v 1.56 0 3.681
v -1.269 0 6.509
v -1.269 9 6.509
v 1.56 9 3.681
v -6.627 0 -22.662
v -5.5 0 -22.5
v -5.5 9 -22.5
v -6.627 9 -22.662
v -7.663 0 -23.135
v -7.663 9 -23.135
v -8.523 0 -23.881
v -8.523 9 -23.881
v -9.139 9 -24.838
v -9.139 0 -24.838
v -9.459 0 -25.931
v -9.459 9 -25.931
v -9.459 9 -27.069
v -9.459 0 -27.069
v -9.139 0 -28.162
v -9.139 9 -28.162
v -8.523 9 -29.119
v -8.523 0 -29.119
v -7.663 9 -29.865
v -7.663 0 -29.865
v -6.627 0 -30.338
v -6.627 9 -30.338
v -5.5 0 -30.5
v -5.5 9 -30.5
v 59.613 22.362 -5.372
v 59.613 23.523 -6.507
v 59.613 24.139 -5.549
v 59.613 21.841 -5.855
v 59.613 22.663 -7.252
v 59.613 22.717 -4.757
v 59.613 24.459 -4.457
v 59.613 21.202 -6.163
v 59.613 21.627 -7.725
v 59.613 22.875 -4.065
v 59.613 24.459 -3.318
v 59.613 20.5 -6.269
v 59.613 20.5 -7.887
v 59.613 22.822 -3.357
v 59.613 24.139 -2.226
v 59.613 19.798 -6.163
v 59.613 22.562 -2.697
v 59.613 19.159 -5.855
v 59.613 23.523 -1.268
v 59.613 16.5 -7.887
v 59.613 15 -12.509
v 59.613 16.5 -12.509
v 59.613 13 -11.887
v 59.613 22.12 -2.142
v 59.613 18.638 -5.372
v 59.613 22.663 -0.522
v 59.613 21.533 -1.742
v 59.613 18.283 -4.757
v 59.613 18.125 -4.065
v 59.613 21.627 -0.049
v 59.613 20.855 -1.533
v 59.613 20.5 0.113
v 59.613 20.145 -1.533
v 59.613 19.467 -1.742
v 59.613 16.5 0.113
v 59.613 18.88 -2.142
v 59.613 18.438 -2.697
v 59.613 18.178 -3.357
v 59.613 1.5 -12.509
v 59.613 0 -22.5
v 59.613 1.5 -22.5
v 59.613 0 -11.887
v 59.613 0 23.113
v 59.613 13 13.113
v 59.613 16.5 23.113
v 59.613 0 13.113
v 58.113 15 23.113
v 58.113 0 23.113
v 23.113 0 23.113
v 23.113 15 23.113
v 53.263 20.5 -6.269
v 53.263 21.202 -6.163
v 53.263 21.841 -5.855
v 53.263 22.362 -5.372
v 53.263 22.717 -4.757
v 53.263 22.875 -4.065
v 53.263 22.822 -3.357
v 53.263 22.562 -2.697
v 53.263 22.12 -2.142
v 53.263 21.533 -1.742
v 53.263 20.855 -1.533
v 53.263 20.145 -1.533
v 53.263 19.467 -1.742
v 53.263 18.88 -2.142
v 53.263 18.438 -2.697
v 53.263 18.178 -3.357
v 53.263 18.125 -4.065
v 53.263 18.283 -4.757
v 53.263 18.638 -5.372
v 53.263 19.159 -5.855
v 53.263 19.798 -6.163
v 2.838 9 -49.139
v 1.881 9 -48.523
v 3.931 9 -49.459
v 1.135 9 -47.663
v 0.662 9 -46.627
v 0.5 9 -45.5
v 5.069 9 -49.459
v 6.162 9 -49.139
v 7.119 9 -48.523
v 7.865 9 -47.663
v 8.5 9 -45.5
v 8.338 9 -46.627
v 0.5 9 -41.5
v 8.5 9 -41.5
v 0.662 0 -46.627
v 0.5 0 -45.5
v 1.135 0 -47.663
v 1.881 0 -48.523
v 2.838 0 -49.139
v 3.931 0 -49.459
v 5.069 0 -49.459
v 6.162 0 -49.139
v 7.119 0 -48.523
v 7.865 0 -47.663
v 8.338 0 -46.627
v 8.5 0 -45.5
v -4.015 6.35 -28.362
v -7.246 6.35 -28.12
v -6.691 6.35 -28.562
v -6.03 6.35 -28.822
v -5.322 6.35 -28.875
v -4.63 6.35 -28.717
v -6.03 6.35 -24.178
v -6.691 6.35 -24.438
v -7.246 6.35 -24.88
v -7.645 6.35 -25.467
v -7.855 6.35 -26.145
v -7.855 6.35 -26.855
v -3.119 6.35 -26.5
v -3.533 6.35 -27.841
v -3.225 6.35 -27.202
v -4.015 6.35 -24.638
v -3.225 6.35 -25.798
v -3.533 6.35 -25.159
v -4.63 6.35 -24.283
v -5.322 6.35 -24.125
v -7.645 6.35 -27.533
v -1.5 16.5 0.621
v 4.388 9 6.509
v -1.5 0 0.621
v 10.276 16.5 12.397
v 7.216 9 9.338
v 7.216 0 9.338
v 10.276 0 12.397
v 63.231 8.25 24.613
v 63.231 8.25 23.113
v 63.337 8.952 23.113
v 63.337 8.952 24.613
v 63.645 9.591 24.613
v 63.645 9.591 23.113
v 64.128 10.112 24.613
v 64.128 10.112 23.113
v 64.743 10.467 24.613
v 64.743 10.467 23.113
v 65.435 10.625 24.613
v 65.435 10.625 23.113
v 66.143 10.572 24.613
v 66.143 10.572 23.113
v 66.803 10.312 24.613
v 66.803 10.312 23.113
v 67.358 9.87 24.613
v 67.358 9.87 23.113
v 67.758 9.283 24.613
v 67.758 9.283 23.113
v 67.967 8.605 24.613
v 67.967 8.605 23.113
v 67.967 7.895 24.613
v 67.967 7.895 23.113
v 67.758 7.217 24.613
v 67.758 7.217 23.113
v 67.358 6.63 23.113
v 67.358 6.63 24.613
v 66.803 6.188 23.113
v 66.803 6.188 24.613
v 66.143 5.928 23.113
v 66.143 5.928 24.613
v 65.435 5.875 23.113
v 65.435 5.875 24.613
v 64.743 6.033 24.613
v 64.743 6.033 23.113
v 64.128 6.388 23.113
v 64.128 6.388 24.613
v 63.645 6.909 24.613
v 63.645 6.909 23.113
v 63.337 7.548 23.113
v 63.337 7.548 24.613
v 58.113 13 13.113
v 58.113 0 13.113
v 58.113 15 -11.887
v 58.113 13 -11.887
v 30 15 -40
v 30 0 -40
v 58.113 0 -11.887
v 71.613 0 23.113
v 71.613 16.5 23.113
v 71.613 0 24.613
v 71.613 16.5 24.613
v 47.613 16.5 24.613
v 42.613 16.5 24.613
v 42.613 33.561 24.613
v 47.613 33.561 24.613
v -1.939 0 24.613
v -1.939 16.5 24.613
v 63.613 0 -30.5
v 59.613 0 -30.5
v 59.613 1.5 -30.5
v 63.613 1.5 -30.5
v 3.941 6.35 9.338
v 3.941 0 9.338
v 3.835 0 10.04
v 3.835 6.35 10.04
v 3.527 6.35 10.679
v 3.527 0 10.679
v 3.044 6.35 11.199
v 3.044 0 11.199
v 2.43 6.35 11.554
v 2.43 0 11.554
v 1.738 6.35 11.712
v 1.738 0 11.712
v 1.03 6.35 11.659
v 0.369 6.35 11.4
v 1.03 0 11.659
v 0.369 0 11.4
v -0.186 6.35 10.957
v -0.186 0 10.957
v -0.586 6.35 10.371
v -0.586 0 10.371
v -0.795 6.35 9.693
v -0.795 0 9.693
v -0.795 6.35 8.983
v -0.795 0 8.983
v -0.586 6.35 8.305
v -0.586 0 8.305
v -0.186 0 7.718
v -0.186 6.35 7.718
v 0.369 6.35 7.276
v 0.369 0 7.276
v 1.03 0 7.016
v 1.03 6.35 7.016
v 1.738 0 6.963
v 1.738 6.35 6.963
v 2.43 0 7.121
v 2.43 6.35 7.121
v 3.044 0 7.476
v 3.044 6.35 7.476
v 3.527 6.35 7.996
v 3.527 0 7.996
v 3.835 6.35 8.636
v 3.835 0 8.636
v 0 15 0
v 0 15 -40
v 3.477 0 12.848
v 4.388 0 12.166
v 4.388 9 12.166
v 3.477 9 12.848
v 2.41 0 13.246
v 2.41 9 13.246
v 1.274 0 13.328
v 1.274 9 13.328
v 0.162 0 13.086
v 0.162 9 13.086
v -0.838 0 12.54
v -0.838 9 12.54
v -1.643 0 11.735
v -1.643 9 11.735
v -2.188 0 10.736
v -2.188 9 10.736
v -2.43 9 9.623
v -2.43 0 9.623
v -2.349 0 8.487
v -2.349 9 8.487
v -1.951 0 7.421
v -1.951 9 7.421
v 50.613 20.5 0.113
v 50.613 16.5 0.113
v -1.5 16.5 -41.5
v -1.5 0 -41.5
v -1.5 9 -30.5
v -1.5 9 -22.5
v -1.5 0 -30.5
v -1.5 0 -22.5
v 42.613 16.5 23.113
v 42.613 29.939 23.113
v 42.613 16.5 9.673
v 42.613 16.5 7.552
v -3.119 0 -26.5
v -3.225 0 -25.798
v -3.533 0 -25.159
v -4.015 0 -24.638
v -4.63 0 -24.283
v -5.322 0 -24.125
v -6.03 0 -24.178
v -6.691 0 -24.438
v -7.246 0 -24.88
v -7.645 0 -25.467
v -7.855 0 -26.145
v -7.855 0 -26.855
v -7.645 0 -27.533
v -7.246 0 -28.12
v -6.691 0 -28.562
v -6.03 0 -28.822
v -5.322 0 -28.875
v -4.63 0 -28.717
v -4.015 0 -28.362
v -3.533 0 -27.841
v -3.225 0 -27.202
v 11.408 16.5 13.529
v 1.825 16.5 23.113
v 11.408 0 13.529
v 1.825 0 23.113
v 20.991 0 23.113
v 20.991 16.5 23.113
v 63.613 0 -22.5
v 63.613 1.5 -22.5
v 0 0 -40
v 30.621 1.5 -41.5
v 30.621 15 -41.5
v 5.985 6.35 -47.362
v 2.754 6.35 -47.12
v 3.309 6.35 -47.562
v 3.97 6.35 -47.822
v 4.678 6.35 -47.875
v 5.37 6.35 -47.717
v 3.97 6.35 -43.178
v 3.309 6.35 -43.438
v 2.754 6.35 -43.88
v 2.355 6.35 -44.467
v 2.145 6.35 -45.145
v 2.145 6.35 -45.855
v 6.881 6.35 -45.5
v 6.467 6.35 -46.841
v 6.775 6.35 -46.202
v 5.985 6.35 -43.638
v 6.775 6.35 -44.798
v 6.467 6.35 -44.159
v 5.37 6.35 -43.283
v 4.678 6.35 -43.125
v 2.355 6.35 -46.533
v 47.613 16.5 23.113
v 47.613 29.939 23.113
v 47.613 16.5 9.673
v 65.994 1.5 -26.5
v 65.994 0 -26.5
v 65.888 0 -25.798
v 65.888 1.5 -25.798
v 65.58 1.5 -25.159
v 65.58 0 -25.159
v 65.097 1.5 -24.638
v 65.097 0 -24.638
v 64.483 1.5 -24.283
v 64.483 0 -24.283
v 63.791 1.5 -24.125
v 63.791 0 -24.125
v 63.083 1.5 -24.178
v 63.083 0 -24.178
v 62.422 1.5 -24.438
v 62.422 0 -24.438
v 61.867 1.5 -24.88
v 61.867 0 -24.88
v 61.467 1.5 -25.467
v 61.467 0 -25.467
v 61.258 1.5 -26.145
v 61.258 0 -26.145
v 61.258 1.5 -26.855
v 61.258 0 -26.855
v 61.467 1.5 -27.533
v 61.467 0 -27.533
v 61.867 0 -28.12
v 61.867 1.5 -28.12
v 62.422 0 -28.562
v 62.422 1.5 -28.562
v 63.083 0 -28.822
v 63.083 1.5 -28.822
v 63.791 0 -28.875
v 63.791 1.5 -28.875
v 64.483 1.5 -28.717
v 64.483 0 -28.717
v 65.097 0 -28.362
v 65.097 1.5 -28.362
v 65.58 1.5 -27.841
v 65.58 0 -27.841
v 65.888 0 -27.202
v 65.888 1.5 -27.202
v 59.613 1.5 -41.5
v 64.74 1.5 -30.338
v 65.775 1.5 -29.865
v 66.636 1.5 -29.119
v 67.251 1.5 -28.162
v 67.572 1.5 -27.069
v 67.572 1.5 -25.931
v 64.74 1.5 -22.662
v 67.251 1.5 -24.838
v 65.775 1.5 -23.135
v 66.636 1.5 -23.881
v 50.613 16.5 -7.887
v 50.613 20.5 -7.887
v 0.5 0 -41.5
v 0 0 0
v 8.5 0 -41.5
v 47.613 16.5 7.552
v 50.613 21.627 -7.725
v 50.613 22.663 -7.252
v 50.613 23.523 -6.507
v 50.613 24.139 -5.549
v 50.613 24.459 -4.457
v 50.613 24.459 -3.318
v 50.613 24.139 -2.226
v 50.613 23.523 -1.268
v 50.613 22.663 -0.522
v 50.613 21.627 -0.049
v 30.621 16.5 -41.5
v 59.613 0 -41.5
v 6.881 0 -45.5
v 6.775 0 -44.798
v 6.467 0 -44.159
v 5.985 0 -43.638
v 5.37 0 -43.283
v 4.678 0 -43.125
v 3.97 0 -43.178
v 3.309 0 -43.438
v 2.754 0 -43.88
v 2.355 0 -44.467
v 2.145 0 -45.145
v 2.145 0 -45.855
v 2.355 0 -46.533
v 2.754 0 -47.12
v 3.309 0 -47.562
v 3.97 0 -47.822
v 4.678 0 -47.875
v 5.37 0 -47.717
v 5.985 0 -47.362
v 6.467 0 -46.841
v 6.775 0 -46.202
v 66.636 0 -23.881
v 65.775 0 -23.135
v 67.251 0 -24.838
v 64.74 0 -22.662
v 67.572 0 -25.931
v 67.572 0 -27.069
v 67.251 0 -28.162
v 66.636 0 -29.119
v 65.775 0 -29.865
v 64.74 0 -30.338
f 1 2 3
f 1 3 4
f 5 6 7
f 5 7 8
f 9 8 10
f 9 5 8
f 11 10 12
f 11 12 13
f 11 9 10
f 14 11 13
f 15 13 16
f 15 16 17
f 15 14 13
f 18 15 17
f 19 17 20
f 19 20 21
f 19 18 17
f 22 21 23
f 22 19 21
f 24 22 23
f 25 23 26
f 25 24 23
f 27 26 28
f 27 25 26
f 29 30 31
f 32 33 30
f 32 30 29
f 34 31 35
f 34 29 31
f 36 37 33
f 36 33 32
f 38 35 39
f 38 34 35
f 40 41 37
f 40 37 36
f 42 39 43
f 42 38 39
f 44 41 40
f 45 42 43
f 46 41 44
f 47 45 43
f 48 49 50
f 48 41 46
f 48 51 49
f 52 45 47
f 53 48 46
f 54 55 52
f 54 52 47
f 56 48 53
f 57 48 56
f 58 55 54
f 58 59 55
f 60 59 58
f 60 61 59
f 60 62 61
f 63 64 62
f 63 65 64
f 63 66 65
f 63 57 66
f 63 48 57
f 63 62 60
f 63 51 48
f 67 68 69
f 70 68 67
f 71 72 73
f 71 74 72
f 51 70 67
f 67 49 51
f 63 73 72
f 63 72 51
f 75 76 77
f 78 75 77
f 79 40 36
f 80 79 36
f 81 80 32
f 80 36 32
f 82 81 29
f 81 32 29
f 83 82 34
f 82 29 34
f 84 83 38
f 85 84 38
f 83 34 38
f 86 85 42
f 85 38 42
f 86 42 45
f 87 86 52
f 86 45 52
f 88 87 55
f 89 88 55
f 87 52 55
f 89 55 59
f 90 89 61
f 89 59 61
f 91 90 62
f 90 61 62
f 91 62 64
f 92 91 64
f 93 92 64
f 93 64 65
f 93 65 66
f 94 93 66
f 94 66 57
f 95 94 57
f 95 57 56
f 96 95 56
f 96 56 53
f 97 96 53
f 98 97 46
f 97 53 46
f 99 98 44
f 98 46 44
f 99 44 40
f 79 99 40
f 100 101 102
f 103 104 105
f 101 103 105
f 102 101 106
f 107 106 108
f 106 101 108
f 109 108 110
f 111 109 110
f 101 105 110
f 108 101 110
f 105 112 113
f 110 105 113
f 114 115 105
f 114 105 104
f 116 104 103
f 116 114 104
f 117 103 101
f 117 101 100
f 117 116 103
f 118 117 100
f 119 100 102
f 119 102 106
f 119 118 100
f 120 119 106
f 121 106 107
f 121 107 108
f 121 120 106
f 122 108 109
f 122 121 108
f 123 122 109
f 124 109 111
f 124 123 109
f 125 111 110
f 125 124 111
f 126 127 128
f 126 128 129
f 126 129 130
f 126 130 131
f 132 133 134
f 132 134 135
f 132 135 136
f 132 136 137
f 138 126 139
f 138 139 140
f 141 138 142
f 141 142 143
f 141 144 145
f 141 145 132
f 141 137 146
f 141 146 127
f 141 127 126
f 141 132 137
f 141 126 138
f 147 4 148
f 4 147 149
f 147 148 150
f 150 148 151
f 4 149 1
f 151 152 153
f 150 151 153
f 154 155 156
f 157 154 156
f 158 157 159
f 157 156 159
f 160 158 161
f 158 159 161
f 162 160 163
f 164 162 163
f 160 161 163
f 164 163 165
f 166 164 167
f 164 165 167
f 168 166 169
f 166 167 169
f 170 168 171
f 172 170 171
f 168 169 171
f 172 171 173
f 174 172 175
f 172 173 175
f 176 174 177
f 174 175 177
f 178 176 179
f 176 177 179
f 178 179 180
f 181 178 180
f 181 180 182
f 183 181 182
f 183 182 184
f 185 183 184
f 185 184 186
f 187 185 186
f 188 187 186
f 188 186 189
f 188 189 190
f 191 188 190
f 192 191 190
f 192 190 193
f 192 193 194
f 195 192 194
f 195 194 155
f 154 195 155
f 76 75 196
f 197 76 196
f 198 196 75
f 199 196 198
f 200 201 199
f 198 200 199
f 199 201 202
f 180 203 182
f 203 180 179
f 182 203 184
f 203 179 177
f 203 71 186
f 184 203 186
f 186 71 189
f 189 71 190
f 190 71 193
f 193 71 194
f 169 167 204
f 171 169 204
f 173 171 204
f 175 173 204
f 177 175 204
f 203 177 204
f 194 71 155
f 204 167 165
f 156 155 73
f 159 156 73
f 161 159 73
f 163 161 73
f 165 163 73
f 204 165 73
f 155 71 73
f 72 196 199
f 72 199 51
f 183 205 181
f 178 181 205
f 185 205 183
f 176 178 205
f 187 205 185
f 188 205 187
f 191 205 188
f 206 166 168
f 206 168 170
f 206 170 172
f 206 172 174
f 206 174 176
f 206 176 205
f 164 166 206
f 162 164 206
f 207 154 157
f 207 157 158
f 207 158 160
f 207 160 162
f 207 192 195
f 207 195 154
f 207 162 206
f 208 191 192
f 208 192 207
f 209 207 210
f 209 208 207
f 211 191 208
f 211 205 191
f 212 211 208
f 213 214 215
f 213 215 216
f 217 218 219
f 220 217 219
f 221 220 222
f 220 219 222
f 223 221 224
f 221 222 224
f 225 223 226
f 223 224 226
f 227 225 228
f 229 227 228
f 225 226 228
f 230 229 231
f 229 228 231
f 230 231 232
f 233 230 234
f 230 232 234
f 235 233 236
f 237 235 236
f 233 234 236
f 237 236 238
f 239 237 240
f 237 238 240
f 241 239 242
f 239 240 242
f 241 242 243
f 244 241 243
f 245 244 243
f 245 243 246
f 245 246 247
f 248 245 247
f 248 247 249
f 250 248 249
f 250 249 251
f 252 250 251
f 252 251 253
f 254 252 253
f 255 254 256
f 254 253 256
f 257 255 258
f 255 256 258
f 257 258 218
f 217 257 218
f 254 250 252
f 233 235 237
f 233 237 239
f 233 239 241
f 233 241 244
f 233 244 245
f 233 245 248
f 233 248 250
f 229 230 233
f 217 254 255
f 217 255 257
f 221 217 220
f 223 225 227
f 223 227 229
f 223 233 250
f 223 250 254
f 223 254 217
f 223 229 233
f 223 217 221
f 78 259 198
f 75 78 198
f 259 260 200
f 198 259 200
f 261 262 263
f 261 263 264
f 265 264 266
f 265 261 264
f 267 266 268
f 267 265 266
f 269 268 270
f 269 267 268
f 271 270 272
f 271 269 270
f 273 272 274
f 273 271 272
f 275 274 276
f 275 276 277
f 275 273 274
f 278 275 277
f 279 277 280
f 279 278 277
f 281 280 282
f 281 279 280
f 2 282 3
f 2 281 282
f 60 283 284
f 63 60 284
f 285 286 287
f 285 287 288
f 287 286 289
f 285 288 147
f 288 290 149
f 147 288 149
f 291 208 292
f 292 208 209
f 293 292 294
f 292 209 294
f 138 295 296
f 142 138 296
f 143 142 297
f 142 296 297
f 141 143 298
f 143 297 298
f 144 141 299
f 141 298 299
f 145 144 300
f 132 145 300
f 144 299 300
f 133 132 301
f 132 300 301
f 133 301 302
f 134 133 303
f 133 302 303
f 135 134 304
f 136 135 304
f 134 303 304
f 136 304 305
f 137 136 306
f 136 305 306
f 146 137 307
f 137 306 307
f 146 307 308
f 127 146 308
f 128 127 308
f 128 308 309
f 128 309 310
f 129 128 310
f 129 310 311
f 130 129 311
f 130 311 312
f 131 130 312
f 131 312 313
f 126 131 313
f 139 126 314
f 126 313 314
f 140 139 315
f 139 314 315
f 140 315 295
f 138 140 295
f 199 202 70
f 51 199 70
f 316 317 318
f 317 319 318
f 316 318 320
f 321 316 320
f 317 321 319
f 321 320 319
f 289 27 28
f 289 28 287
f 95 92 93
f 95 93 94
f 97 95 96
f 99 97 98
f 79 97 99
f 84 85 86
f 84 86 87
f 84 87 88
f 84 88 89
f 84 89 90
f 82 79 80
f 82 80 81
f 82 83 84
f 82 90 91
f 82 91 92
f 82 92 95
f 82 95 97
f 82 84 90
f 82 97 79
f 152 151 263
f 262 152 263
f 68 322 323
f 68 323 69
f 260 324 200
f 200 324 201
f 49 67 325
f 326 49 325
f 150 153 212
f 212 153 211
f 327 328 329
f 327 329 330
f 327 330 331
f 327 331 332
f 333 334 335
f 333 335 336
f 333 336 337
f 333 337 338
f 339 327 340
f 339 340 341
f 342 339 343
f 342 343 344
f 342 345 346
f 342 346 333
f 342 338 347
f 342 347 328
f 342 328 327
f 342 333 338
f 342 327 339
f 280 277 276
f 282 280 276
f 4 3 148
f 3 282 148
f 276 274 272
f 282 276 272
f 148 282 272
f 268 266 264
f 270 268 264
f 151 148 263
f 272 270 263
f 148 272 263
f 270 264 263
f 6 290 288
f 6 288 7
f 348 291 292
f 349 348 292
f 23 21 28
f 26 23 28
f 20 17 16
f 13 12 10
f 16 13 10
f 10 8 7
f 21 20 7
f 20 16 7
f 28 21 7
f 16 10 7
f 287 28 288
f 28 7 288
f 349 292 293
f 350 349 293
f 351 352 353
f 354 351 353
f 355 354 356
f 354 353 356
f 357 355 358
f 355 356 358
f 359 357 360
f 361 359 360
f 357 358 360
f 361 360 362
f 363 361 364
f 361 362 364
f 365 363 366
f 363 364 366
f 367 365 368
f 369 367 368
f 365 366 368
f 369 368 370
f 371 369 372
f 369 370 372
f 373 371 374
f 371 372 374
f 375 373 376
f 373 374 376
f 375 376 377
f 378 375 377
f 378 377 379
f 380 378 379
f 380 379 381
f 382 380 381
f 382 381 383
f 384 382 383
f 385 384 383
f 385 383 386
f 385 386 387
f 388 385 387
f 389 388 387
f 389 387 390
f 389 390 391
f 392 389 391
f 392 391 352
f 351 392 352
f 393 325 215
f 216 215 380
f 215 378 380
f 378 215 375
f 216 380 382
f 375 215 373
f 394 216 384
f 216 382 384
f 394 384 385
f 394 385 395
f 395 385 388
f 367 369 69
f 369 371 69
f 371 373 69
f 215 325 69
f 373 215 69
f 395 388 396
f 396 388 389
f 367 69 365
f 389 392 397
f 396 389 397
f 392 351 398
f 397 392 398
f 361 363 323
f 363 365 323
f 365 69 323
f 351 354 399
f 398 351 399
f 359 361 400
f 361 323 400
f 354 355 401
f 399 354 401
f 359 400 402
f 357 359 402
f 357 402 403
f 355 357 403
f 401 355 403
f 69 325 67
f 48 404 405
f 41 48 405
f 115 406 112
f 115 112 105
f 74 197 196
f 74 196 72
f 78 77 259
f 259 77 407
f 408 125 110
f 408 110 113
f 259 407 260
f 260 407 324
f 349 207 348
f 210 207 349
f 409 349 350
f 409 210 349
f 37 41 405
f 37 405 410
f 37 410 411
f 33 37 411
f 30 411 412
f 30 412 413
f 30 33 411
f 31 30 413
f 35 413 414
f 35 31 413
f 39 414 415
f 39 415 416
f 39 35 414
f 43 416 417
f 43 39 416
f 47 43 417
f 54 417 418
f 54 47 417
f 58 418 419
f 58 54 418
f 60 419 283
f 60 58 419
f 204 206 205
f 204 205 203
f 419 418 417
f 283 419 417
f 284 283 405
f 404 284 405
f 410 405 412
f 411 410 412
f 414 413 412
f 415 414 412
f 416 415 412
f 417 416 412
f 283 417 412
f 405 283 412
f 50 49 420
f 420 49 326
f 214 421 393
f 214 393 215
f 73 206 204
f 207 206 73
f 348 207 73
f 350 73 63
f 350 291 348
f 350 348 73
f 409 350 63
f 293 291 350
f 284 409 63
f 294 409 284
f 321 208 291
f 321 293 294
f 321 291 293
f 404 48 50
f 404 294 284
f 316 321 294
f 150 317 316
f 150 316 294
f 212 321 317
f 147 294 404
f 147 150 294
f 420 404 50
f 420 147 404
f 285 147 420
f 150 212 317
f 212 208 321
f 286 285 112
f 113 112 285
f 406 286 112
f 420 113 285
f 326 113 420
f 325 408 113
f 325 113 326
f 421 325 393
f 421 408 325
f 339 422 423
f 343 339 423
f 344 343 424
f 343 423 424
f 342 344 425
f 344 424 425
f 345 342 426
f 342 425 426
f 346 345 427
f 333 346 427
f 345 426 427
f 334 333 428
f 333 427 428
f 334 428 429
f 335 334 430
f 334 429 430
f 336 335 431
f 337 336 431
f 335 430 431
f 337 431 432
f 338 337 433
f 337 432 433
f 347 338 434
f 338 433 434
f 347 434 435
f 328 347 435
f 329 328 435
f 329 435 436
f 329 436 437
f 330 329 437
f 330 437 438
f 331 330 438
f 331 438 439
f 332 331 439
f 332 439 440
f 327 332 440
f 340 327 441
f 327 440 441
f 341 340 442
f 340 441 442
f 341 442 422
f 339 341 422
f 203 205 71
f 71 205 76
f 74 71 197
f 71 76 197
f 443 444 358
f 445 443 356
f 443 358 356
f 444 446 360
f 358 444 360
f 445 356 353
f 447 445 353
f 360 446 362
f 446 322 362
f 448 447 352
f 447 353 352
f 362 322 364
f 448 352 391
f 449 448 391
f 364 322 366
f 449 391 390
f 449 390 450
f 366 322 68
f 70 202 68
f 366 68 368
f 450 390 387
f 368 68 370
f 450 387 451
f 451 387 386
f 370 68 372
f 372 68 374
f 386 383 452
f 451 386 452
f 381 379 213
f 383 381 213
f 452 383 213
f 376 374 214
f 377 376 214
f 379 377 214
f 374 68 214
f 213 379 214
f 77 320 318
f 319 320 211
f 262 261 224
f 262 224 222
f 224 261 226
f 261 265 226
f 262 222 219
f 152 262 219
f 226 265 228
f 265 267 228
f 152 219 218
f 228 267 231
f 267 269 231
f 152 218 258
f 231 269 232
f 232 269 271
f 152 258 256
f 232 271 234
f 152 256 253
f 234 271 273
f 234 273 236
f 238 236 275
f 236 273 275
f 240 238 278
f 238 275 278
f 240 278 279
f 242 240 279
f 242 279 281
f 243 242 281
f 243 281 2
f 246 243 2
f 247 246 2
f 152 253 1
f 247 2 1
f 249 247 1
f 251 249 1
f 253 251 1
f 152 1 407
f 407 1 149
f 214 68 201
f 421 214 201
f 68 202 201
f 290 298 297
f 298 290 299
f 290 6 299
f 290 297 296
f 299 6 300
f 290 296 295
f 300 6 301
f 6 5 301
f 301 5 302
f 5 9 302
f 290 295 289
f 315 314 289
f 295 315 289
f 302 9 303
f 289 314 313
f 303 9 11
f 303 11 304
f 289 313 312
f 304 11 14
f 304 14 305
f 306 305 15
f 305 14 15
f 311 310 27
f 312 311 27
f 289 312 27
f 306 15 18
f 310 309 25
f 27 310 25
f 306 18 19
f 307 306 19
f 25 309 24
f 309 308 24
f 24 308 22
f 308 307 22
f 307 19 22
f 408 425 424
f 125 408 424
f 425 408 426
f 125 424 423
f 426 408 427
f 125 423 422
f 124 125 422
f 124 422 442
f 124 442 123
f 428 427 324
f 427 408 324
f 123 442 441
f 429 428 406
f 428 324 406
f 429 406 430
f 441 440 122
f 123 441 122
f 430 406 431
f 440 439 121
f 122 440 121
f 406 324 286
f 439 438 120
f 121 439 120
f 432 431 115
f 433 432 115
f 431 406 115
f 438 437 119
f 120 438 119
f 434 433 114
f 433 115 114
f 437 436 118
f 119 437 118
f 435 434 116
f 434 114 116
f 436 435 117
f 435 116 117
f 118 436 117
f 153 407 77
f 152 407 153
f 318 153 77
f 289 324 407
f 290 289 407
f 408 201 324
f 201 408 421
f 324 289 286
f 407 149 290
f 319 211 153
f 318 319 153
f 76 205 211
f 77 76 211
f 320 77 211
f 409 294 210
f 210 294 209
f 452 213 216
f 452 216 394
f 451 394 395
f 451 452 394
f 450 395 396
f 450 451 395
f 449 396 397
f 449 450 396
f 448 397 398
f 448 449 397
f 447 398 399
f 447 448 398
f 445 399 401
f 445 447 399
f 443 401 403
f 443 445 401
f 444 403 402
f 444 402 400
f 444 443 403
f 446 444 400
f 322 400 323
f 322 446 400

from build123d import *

# Parameters (mm, degrees)
SKETCH1_W            = 38
SKETCH1_H            = 1.5
SKETCH1_W_2          = 1.5
SKETCH1_H_2          = 32
SKETCH1_W_3          = 30
SKETCH1_H_3          = 40
BOSS_EXTRUDE1_DEPTH  = 15
BOSS_EXTRUDE2_DEPTH  = 1.5
SKETCH7_W            = 22
SKETCH7_H            = 12
BOSS_EXTRUDE4_DEPTH  = 10.5
SKETCH9_W            = 12.5
SKETCH9_H            = 8.5
CUT_EXTRUDE10_DEPTH  = 4.5
BOSS_EXTRUDE6_DEPTH  = 1.5
EXTRUDE_THIN1_START  = -20
EXTRUDE_THIN1_DEPTH  = 5
SKETCH16_W           = 10.5
SKETCH16_H           = 12
CUT_EXTRUDE15_DEPTH  = 35.121320344
BOSS_EXTRUDE10_DEPTH = 16
CUT_EXTRUDE16_DEPTH  = 34.560660172
SKETCH21_W           = 1.5
SKETCH21_H           = 25
CUT_EXTRUDE17_DEPTH  = 13
SKETCH25_W           = 1.5
SKETCH25_H           = 16.5
BOSS_EXTRUDE13_DEPTH = 12
BOSS_EXTRUDE14_DEPTH = 9
SKETCH27_R           = 2.38125
CUT_EXTRUDE18_DEPTH  = 6.35
SKETCH29_R           = 2.38125
CUT_EXTRUDE19_DEPTH  = 2.5
BOSS_EXTRUDE15_DEPTH = 9
BOSS_EXTRUDE16_DEPTH = 9
BOSS_EXTRUDE17_DEPTH = 9
BOSS_EXTRUDE18_DEPTH = 1.5
SKETCH34_R           = 2.38125
CUT_EXTRUDE20_DEPTH  = 34.560660172
SKETCH35_R           = 2.38125
CUT_EXTRUDE21_DEPTH  = 6.35


with BuildPart() as part:
    # Sketch1 → Boss-Extrude1 (new body)
    with BuildSketch(Plane(origin=(0, 0, 0), x_dir=(1, 0, 0), z_dir=(0, 1, 0))):
        Polygon((23.112698372, -23.112698372), (0, 0), (-1.060660172, -1.060660172), (10.2760191, -12.397339444), (11.408080409, -13.529400753), (20.991378029, -23.112698372), (22.0520382, -24.173358544), align=None)
        Polygon((23.112698372, -24.612698372), (23.112698372, -23.112698372), (22.0520382, -24.173358544), (22.491378029, -24.612698372), align=None)
        with Locations((42.112698372, -23.862698372)):
            Rectangle(SKETCH1_W, SKETCH1_H)
        with Locations((61.862698372, -23.862698372)):
            Rectangle(SKETCH1_W_2, SKETCH1_H)
        with Locations((61.862698372, -7.112698372)):
            Rectangle(SKETCH1_W_2, SKETCH1_H_2)
        Polygon((62.173358544, 9.9479618), (61.112698372, 8.887301628), (62.612698372, 8.887301628), (62.612698372, 9.508621971), align=None)
        Polygon((31.060660172, 41.060660172), (30, 40), (61.112698372, 8.887301628), (62.173358544, 9.9479618), align=None)
        Polygon((30, 41.5), (30, 40), (31.060660172, 41.060660172), (30.621320344, 41.5), align=None)
        with Locations((15, 40.75)):
            Rectangle(SKETCH1_W_3, SKETCH1_H)
        with Locations((-0.75, 40.75)):
            Rectangle(SKETCH1_W_2, SKETCH1_H)
        with Locations((-0.75, 20)):
            Rectangle(SKETCH1_W_2, SKETCH1_H_3)
        Polygon((-1.060660172, -1.060660172), (0, 0), (-1.5, 0), (-1.5, -0.621320344), align=None)
        Polygon((22.491378029, -24.612698372), (22.0520382, -24.173358544), (20.991378029, -23.112698372), (1.824782789, -23.112698372), (11.408080409, -13.529400753), (10.2760191, -12.397339444), (-1.939339828, -24.612698372), align=None)
    extrude(amount=BOSS_EXTRUDE1_DEPTH)

    # Sketch2 → Boss-Extrude2 (add)
    with BuildSketch(Plane(origin=(0, 15, 0), x_dir=(1, 0, 0), z_dir=(0, 1, 0))):
        Polygon((30.621320344, 41.5), (-1.5, 41.5), (-1.5, -0.621320344), (10.2760191, -12.397339444), (11.408080409, -13.529400753), (20.991378029, -23.112698372), (22.491378029, -24.612698372), (62.612698372, -24.612698372), (62.612698372, 9.508621971), align=None)
        Polygon((0, 40), (30, 40), (61.112698372, 8.887301628), (61.112698372, -23.112698372), (23.112698372, -23.112698372), (0, 0), align=None, mode=Mode.SUBTRACT)
        Polygon((30, 40), (61.112698372, 8.887301628), (61.112698372, -23.112698372), (23.112698372, -23.112698372), (0, 0), (0, 40), align=None)
        Polygon((11.408080409, -13.529400753), (10.2760191, -12.397339444), (-1.939339828, -24.612698372), (19.481361537, -24.612698372), (22.491378029, -24.612698372), (20.991378029, -23.112698372), (1.824782789, -23.112698372), align=None)
    extrude(amount=BOSS_EXTRUDE2_DEPTH)

    # Sketch7 → Boss-Extrude4 (add)
    with BuildSketch(Plane(origin=(62.612698372, 0, 0), x_dir=(0, 0, -1), z_dir=(1, 0, 0))):
        with Locations((-1.491378029, 6)):
            Rectangle(SKETCH7_W, SKETCH7_H)
    extrude(amount=BOSS_EXTRUDE4_DEPTH)

    # Sketch9 → Cut-Extrude10 (cut)
    with BuildSketch(Plane.ZY.offset(-61.112698372)):
        with Locations((1.362698372, 6.25)):
            Rectangle(SKETCH9_W, SKETCH9_H)
    extrude(amount=-CUT_EXTRUDE10_DEPTH, mode=Mode.SUBTRACT)

    # Sketch11 → Boss-Extrude6 (add)
    with BuildSketch(Plane.XZ):
        Polygon((62.612698372, -9.508621971), (30.621320344, -41.5), (62.612698372, -41.5), align=None)
    extrude(amount=-BOSS_EXTRUDE6_DEPTH)

    # Sketch12 → Extrude-Thin1 (add)
    with BuildSketch(Plane(origin=(62.612698372, 0, 0), x_dir=(0, 0, -1), z_dir=(1, 0, 0)).offset(EXTRUDE_THIN1_START)):
        Polygon((-7.5520382, 16.5), (-24.612698372, 33.560660172), (-24.612698372, 16.5), (-23.112698372, 16.5), (-23.112698372, 29.939339828), (-8.612698372, 15.439339828), align=None)
    extrude(amount=EXTRUDE_THIN1_DEPTH)

    # Sketch16 → Cut-Extrude15 (cut, through all)
    with BuildSketch(Plane(origin=(0, 0, -9.508621971), x_dir=(-1, 0, 0), z_dir=(0, 0, -1))):
        with Locations((-67.862698372, 6)):
            Rectangle(SKETCH16_W, SKETCH16_H)
    extrude(amount=-CUT_EXTRUDE15_DEPTH, mode=Mode.SUBTRACT)

    # Sketch19 → Boss-Extrude10 (add)
    with BuildSketch(Plane.XZ):
        Polygon((59.612698372, -10.387301628), (59.612698372, 23.112698372), (58.112698372, 23.112698372), (58.112698372, -11.887301628), align=None)
    extrude(amount=-BOSS_EXTRUDE10_DEPTH)

    # Sketch20 → Cut-Extrude16 (cut, through all)
    with BuildSketch(Plane.XZ):
        Polygon((59.612698372, 23.112698372), (59.612698372, 24.612698372), (62.612698372, 24.612698372), (62.612698372, -41.5), (59.612698372, -41.5), align=None)
    extrude(amount=-CUT_EXTRUDE16_DEPTH, mode=Mode.SUBTRACT)

    # Sketch21 → Cut-Extrude17 (cut)
    with BuildSketch(Plane.XZ):
        with Locations((58.862698372, 0.612698372)):
            Rectangle(SKETCH21_W, SKETCH21_H)
    extrude(amount=-CUT_EXTRUDE17_DEPTH, mode=Mode.SUBTRACT)

    # Sketch25 → Boss-Extrude13 (add)
    with BuildSketch(Plane(origin=(59.612698372, 0, 0), x_dir=(0, 0, -1), z_dir=(1, 0, 0))):
        with Locations((-23.862698372, 8.25)):
            Rectangle(SKETCH25_W, SKETCH25_H)
    extrude(amount=BOSS_EXTRUDE13_DEPTH)

    # Sketch26 → Boss-Extrude14 (add)
    with BuildSketch(Plane(origin=(59.612698372, 0, 0), x_dir=(0, 0, -1), z_dir=(1, 0, 0))):
        with BuildLine():
            Line((-0.112698372, 20.5), (-0.112698372, 16.5))
            Line((-0.112698372, 16.5), (3.887301628, 16.5))
            Line((3.887301628, 16.5), (7.887301628, 16.5))
            Line((7.887301628, 16.5), (7.887301628, 20.5))
            ThreePointArc((7.887301628, 20.5), (3.887301628, 24.5), (-0.112698372, 20.5))
        make_face()
    extrude(amount=-BOSS_EXTRUDE14_DEPTH)

    # Sketch27 → Cut-Extrude18 (cut)
    with BuildSketch(Plane(origin=(59.612698372, 0, 0), x_dir=(0, 0, -1), z_dir=(1, 0, 0))):
        with Locations((3.887301628, 20.5)):
            Circle(SKETCH27_R)
    extrude(amount=-CUT_EXTRUDE18_DEPTH, mode=Mode.SUBTRACT)

    # Sketch29 → Cut-Extrude19 (cut, through all)
    with BuildSketch(Plane(origin=(0, 0, 23.112698372), x_dir=(-1, 0, 0), z_dir=(0, 0, -1))):
        with Locations((-65.612698372, 8.25)):
            Circle(SKETCH29_R)
    extrude(amount=-CUT_EXTRUDE19_DEPTH, mode=Mode.SUBTRACT)

    # Sketch30 → Boss-Extrude15 (add)
    with BuildSketch(Plane.XZ):
        with BuildLine():
            Line((4.5, -41.5), (0.5, -41.5))
            Line((0.5, -41.5), (0.5, -45.5))
            ThreePointArc((0.5, -45.5), (4.5, -49.5), (8.5, -45.5))
            Line((8.5, -45.5), (8.5, -41.5))
            Line((8.5, -41.5), (4.5, -41.5))
        make_face()
    extrude(amount=-BOSS_EXTRUDE15_DEPTH)

    # Sketch31 → Boss-Extrude16 (add)
    with BuildSketch(Plane.XZ):
        with BuildLine():
            Line((-5.5, -30.5), (-1.5, -30.5))
            Line((-1.5, -30.5), (-1.5, -26.5))
            Line((-1.5, -26.5), (-1.5, -22.5))
            Line((-1.5, -22.5), (-5.5, -22.5))
            ThreePointArc((-5.5, -22.5), (-9.5, -26.5), (-5.5, -30.5))
        make_face()
    extrude(amount=-BOSS_EXTRUDE16_DEPTH)

    # Sketch32 → Boss-Extrude17 (add)
    with BuildSketch(Plane.XZ):
        with BuildLine():
            Line((-1.268844699, 6.509329894), (1.559582425, 3.680902769))
            Line((1.559582425, 3.680902769), (4.38800955, 6.509329894))
            Line((4.38800955, 6.509329894), (7.216436675, 9.337757018))
            Line((7.216436675, 9.337757018), (4.38800955, 12.166184143))
            ThreePointArc((4.38800955, 12.166184143), (-1.268844699, 12.166184143), (-1.268844699, 6.509329894))
        make_face()
    extrude(amount=-BOSS_EXTRUDE17_DEPTH)

    # Sketch33 → Boss-Extrude18 (add)
    with BuildSketch(Plane.XZ):
        with BuildLine():
            Line((59.612698372, -26.5), (59.612698372, -30.5))
            Line((59.612698372, -30.5), (63.612698372, -30.5))
            ThreePointArc((63.612698372, -30.5), (67.612698372, -26.5), (63.612698372, -22.5))
            Line((63.612698372, -22.5), (59.612698372, -22.5))
            Line((59.612698372, -22.5), (59.612698372, -26.5))
        make_face()
    extrude(amount=-BOSS_EXTRUDE18_DEPTH)

    # Sketch34 → Cut-Extrude20 (cut, through all)
    with BuildSketch(Plane.XZ):
        with Locations((63.612698372, -26.5)):
            Circle(SKETCH34_R)
    extrude(amount=-CUT_EXTRUDE20_DEPTH, mode=Mode.SUBTRACT)

    # Sketch35 → Cut-Extrude21 (cut)
    with BuildSketch(Plane.XZ):
        with Locations((4.5, -45.5)):
            Circle(SKETCH35_R)
        with Locations((-5.5, -26.5)):
            Circle(SKETCH35_R)
        with Locations((1.559582425, 9.337757018)):
            Circle(SKETCH35_R)
    extrude(amount=-CUT_EXTRUDE21_DEPTH, mode=Mode.SUBTRACT)


solid = part.part
